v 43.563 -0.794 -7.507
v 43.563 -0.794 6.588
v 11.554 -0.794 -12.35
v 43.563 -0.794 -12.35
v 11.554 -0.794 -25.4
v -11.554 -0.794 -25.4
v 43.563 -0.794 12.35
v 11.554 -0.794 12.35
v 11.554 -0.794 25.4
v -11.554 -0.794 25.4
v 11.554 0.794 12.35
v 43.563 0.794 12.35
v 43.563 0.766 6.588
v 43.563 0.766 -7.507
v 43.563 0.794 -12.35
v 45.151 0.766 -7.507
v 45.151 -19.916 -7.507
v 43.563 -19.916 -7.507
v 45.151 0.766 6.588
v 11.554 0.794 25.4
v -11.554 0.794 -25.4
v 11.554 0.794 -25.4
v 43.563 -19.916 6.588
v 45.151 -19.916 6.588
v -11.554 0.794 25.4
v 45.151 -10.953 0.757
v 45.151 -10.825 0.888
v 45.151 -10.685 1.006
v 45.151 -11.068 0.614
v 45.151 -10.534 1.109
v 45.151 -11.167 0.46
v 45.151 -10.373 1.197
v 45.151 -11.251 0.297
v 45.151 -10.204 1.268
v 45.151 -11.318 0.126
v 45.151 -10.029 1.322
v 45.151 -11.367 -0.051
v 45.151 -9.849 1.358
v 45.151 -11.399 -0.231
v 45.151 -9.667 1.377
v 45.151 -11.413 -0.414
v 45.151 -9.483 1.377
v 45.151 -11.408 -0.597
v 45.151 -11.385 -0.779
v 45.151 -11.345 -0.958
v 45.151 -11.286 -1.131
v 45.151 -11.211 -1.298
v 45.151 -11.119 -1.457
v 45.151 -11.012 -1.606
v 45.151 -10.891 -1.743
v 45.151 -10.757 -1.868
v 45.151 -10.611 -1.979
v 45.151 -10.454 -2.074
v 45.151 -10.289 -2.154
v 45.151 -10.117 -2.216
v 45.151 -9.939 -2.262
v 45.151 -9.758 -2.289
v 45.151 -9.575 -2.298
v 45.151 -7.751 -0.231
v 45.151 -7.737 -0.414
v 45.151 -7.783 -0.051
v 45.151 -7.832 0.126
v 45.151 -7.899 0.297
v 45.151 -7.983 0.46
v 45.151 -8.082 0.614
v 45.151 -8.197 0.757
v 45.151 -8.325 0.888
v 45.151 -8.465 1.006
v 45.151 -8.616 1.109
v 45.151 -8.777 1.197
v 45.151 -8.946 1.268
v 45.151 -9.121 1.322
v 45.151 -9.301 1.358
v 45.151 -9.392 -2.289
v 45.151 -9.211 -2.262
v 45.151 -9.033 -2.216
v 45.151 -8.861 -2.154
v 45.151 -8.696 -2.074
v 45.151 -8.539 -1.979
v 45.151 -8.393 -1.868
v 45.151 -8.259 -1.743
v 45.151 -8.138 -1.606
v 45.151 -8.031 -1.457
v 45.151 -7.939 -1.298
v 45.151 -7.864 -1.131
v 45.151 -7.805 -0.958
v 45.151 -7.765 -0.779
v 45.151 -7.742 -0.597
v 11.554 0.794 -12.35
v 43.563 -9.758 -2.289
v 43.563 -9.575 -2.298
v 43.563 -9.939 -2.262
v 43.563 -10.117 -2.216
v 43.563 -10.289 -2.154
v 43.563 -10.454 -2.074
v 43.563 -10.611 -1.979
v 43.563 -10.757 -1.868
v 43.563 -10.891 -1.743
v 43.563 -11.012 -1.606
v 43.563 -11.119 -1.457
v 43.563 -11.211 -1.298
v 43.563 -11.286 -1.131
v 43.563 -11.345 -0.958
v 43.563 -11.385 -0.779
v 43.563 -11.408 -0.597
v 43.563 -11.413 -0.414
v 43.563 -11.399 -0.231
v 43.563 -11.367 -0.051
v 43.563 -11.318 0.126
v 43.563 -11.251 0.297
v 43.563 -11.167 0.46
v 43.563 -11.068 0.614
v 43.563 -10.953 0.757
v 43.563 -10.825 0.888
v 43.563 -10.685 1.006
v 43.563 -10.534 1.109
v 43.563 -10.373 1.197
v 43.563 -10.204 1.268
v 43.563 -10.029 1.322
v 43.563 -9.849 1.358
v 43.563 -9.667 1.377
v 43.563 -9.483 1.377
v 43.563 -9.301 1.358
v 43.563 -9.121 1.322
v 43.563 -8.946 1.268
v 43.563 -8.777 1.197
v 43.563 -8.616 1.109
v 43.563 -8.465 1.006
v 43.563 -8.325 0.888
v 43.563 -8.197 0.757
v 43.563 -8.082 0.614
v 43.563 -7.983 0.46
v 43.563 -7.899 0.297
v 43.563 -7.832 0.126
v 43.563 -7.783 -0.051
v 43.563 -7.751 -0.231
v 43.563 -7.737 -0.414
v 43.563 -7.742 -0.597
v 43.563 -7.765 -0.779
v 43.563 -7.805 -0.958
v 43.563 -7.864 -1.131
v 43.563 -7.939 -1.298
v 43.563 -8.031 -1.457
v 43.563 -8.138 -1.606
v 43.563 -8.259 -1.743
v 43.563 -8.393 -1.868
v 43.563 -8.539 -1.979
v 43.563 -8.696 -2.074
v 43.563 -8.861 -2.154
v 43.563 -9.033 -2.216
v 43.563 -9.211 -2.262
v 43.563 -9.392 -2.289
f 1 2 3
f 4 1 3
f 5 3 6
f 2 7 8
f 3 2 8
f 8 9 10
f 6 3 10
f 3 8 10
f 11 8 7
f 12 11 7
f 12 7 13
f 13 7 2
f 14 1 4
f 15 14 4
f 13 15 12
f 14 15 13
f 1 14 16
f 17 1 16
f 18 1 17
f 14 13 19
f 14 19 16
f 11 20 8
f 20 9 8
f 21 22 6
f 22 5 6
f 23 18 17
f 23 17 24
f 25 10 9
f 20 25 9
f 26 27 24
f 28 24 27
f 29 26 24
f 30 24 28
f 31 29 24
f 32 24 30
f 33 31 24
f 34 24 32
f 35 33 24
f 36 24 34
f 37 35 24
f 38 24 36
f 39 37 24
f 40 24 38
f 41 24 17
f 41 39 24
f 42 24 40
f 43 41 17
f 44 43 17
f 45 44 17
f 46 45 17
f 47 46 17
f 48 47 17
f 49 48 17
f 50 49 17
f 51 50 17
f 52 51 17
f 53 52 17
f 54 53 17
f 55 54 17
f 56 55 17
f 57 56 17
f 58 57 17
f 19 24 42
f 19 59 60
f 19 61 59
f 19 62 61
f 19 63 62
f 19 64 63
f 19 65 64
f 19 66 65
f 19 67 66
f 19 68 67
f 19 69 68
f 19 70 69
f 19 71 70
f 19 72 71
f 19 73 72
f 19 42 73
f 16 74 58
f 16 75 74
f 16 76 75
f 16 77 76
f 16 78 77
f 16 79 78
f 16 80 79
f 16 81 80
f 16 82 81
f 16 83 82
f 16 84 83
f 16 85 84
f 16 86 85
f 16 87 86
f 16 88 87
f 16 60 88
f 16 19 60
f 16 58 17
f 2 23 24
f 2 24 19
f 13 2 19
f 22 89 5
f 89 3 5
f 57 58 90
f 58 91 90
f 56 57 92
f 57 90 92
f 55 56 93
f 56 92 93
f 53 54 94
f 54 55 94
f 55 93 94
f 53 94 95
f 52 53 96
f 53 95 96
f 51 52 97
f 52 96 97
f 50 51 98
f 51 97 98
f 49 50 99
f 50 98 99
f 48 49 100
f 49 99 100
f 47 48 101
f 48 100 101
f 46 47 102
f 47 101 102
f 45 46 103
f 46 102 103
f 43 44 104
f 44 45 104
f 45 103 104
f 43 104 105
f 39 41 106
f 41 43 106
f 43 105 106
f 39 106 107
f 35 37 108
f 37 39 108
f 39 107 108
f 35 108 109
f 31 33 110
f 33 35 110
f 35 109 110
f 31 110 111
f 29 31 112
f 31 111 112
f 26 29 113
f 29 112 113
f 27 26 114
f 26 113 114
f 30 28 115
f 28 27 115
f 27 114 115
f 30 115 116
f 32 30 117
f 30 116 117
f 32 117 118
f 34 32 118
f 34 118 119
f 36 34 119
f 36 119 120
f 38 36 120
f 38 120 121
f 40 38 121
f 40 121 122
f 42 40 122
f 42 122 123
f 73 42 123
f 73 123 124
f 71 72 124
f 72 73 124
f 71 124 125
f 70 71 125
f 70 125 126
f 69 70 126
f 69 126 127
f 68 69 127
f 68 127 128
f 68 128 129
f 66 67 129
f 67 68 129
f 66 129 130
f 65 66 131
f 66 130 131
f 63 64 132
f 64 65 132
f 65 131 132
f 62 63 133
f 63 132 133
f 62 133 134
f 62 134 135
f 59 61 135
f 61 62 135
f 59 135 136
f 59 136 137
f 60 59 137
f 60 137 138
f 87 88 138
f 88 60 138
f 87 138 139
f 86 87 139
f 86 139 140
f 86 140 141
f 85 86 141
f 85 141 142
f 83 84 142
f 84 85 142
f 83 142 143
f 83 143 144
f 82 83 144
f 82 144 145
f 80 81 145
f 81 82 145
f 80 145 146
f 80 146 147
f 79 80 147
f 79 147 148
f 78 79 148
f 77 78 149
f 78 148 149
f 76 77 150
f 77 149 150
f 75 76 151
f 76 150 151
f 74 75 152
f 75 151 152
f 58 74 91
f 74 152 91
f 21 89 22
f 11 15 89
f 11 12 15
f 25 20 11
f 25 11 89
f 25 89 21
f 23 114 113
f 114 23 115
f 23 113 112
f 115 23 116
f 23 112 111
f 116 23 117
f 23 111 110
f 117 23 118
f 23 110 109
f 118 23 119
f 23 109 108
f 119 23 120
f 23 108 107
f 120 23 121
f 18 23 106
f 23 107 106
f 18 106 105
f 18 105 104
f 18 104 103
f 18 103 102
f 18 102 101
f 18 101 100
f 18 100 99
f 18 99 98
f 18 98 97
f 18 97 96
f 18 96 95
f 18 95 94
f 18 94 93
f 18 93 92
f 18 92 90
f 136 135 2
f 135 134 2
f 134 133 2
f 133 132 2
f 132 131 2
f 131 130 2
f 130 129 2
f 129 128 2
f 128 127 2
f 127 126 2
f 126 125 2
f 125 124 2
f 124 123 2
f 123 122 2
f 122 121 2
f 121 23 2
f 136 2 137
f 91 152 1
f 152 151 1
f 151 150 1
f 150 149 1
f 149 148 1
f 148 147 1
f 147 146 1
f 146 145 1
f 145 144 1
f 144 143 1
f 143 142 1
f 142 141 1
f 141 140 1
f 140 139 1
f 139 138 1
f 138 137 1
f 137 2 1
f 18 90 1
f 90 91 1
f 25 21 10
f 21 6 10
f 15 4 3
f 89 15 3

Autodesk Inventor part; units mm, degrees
ref_plane "YZ Plane" through (0, 0, 0) normal (1, 0, 0) x (0, 1, 0)
ref_plane "XZ Plane" through (0, 0, 0) normal (0, 1, 0) x (-1, 0, 0)
ref_plane "XY Plane" through (0, 0, 0) normal (0, 0, 1) x (1, 0, 0)
sketch "Sketch1" plane through (0, 0, 0) normal (0, 1, 0) x (-1, 0, 0)
  line L0 (-11.5541, -25.4) -> (11.5541, -25.4)
  line L1 (11.5541, -25.4) -> (11.5541, 25.4)
  line L2 (11.5541, 25.4) -> (-11.5541, 25.4)
  line L3 (-11.5541, 25.4) -> (-11.5541, -25.4)
  line L4 (-11.5541, -25.4) -> (11.5541, 25.4) construction
  line L5 (11.5541, -25.4) -> (-11.5541, 25.4) construction
  line L6 (-43.5634, -12.35) -> (-11.5541, -12.35)
  line L7 (-11.5541, -12.35) -> (-11.5541, 12.35)
  line L8 (-11.5541, 12.35) -> (-43.5634, 12.35)
  line L9 (-43.5634, 12.35) -> (-43.5634, -12.35)
  line L10 (-43.5634, -12.35) -> (-11.5541, 12.35) construction
  line L11 (-11.5541, -12.35) -> (-43.5634, 12.35) construction
  point P0 (0, 0)
  point P1 (-27.5588, 0)
  dimension "d0" = 50.8
extrude "Extrusion1" add sketch "Sketch1" along normal mid plane 1.5875
sketch "Sketch2" plane through (43.5634, -0.7937, -12.35) normal (1, 0, 0) x (0, 0, -1)
  line L0 (-4.8431, -19.1223) -> (-18.9376, -19.1223)
  line L1 (-18.9376, -19.1223) -> (-18.9376, 1.5598)
  line L2 (-18.9376, 1.5598) -> (-4.8431, 1.5598)
  line L3 (-4.8431, 1.5598) -> (-4.8431, -19.1223)
  line L4 (-4.8431, -19.1223) -> (-18.9376, 1.5598) construction
  line L5 (-18.9376, -19.1223) -> (-4.8431, 1.5598) construction
  circle A0 centre (-11.8904, -8.7813) radius 1.8384
  point P0 (-12.35, 0.7937)
extrude "Extrusion2" add sketch "Sketch2" along normal blind 1.5875
properties part number "ultrasonic_sensor_ho"
